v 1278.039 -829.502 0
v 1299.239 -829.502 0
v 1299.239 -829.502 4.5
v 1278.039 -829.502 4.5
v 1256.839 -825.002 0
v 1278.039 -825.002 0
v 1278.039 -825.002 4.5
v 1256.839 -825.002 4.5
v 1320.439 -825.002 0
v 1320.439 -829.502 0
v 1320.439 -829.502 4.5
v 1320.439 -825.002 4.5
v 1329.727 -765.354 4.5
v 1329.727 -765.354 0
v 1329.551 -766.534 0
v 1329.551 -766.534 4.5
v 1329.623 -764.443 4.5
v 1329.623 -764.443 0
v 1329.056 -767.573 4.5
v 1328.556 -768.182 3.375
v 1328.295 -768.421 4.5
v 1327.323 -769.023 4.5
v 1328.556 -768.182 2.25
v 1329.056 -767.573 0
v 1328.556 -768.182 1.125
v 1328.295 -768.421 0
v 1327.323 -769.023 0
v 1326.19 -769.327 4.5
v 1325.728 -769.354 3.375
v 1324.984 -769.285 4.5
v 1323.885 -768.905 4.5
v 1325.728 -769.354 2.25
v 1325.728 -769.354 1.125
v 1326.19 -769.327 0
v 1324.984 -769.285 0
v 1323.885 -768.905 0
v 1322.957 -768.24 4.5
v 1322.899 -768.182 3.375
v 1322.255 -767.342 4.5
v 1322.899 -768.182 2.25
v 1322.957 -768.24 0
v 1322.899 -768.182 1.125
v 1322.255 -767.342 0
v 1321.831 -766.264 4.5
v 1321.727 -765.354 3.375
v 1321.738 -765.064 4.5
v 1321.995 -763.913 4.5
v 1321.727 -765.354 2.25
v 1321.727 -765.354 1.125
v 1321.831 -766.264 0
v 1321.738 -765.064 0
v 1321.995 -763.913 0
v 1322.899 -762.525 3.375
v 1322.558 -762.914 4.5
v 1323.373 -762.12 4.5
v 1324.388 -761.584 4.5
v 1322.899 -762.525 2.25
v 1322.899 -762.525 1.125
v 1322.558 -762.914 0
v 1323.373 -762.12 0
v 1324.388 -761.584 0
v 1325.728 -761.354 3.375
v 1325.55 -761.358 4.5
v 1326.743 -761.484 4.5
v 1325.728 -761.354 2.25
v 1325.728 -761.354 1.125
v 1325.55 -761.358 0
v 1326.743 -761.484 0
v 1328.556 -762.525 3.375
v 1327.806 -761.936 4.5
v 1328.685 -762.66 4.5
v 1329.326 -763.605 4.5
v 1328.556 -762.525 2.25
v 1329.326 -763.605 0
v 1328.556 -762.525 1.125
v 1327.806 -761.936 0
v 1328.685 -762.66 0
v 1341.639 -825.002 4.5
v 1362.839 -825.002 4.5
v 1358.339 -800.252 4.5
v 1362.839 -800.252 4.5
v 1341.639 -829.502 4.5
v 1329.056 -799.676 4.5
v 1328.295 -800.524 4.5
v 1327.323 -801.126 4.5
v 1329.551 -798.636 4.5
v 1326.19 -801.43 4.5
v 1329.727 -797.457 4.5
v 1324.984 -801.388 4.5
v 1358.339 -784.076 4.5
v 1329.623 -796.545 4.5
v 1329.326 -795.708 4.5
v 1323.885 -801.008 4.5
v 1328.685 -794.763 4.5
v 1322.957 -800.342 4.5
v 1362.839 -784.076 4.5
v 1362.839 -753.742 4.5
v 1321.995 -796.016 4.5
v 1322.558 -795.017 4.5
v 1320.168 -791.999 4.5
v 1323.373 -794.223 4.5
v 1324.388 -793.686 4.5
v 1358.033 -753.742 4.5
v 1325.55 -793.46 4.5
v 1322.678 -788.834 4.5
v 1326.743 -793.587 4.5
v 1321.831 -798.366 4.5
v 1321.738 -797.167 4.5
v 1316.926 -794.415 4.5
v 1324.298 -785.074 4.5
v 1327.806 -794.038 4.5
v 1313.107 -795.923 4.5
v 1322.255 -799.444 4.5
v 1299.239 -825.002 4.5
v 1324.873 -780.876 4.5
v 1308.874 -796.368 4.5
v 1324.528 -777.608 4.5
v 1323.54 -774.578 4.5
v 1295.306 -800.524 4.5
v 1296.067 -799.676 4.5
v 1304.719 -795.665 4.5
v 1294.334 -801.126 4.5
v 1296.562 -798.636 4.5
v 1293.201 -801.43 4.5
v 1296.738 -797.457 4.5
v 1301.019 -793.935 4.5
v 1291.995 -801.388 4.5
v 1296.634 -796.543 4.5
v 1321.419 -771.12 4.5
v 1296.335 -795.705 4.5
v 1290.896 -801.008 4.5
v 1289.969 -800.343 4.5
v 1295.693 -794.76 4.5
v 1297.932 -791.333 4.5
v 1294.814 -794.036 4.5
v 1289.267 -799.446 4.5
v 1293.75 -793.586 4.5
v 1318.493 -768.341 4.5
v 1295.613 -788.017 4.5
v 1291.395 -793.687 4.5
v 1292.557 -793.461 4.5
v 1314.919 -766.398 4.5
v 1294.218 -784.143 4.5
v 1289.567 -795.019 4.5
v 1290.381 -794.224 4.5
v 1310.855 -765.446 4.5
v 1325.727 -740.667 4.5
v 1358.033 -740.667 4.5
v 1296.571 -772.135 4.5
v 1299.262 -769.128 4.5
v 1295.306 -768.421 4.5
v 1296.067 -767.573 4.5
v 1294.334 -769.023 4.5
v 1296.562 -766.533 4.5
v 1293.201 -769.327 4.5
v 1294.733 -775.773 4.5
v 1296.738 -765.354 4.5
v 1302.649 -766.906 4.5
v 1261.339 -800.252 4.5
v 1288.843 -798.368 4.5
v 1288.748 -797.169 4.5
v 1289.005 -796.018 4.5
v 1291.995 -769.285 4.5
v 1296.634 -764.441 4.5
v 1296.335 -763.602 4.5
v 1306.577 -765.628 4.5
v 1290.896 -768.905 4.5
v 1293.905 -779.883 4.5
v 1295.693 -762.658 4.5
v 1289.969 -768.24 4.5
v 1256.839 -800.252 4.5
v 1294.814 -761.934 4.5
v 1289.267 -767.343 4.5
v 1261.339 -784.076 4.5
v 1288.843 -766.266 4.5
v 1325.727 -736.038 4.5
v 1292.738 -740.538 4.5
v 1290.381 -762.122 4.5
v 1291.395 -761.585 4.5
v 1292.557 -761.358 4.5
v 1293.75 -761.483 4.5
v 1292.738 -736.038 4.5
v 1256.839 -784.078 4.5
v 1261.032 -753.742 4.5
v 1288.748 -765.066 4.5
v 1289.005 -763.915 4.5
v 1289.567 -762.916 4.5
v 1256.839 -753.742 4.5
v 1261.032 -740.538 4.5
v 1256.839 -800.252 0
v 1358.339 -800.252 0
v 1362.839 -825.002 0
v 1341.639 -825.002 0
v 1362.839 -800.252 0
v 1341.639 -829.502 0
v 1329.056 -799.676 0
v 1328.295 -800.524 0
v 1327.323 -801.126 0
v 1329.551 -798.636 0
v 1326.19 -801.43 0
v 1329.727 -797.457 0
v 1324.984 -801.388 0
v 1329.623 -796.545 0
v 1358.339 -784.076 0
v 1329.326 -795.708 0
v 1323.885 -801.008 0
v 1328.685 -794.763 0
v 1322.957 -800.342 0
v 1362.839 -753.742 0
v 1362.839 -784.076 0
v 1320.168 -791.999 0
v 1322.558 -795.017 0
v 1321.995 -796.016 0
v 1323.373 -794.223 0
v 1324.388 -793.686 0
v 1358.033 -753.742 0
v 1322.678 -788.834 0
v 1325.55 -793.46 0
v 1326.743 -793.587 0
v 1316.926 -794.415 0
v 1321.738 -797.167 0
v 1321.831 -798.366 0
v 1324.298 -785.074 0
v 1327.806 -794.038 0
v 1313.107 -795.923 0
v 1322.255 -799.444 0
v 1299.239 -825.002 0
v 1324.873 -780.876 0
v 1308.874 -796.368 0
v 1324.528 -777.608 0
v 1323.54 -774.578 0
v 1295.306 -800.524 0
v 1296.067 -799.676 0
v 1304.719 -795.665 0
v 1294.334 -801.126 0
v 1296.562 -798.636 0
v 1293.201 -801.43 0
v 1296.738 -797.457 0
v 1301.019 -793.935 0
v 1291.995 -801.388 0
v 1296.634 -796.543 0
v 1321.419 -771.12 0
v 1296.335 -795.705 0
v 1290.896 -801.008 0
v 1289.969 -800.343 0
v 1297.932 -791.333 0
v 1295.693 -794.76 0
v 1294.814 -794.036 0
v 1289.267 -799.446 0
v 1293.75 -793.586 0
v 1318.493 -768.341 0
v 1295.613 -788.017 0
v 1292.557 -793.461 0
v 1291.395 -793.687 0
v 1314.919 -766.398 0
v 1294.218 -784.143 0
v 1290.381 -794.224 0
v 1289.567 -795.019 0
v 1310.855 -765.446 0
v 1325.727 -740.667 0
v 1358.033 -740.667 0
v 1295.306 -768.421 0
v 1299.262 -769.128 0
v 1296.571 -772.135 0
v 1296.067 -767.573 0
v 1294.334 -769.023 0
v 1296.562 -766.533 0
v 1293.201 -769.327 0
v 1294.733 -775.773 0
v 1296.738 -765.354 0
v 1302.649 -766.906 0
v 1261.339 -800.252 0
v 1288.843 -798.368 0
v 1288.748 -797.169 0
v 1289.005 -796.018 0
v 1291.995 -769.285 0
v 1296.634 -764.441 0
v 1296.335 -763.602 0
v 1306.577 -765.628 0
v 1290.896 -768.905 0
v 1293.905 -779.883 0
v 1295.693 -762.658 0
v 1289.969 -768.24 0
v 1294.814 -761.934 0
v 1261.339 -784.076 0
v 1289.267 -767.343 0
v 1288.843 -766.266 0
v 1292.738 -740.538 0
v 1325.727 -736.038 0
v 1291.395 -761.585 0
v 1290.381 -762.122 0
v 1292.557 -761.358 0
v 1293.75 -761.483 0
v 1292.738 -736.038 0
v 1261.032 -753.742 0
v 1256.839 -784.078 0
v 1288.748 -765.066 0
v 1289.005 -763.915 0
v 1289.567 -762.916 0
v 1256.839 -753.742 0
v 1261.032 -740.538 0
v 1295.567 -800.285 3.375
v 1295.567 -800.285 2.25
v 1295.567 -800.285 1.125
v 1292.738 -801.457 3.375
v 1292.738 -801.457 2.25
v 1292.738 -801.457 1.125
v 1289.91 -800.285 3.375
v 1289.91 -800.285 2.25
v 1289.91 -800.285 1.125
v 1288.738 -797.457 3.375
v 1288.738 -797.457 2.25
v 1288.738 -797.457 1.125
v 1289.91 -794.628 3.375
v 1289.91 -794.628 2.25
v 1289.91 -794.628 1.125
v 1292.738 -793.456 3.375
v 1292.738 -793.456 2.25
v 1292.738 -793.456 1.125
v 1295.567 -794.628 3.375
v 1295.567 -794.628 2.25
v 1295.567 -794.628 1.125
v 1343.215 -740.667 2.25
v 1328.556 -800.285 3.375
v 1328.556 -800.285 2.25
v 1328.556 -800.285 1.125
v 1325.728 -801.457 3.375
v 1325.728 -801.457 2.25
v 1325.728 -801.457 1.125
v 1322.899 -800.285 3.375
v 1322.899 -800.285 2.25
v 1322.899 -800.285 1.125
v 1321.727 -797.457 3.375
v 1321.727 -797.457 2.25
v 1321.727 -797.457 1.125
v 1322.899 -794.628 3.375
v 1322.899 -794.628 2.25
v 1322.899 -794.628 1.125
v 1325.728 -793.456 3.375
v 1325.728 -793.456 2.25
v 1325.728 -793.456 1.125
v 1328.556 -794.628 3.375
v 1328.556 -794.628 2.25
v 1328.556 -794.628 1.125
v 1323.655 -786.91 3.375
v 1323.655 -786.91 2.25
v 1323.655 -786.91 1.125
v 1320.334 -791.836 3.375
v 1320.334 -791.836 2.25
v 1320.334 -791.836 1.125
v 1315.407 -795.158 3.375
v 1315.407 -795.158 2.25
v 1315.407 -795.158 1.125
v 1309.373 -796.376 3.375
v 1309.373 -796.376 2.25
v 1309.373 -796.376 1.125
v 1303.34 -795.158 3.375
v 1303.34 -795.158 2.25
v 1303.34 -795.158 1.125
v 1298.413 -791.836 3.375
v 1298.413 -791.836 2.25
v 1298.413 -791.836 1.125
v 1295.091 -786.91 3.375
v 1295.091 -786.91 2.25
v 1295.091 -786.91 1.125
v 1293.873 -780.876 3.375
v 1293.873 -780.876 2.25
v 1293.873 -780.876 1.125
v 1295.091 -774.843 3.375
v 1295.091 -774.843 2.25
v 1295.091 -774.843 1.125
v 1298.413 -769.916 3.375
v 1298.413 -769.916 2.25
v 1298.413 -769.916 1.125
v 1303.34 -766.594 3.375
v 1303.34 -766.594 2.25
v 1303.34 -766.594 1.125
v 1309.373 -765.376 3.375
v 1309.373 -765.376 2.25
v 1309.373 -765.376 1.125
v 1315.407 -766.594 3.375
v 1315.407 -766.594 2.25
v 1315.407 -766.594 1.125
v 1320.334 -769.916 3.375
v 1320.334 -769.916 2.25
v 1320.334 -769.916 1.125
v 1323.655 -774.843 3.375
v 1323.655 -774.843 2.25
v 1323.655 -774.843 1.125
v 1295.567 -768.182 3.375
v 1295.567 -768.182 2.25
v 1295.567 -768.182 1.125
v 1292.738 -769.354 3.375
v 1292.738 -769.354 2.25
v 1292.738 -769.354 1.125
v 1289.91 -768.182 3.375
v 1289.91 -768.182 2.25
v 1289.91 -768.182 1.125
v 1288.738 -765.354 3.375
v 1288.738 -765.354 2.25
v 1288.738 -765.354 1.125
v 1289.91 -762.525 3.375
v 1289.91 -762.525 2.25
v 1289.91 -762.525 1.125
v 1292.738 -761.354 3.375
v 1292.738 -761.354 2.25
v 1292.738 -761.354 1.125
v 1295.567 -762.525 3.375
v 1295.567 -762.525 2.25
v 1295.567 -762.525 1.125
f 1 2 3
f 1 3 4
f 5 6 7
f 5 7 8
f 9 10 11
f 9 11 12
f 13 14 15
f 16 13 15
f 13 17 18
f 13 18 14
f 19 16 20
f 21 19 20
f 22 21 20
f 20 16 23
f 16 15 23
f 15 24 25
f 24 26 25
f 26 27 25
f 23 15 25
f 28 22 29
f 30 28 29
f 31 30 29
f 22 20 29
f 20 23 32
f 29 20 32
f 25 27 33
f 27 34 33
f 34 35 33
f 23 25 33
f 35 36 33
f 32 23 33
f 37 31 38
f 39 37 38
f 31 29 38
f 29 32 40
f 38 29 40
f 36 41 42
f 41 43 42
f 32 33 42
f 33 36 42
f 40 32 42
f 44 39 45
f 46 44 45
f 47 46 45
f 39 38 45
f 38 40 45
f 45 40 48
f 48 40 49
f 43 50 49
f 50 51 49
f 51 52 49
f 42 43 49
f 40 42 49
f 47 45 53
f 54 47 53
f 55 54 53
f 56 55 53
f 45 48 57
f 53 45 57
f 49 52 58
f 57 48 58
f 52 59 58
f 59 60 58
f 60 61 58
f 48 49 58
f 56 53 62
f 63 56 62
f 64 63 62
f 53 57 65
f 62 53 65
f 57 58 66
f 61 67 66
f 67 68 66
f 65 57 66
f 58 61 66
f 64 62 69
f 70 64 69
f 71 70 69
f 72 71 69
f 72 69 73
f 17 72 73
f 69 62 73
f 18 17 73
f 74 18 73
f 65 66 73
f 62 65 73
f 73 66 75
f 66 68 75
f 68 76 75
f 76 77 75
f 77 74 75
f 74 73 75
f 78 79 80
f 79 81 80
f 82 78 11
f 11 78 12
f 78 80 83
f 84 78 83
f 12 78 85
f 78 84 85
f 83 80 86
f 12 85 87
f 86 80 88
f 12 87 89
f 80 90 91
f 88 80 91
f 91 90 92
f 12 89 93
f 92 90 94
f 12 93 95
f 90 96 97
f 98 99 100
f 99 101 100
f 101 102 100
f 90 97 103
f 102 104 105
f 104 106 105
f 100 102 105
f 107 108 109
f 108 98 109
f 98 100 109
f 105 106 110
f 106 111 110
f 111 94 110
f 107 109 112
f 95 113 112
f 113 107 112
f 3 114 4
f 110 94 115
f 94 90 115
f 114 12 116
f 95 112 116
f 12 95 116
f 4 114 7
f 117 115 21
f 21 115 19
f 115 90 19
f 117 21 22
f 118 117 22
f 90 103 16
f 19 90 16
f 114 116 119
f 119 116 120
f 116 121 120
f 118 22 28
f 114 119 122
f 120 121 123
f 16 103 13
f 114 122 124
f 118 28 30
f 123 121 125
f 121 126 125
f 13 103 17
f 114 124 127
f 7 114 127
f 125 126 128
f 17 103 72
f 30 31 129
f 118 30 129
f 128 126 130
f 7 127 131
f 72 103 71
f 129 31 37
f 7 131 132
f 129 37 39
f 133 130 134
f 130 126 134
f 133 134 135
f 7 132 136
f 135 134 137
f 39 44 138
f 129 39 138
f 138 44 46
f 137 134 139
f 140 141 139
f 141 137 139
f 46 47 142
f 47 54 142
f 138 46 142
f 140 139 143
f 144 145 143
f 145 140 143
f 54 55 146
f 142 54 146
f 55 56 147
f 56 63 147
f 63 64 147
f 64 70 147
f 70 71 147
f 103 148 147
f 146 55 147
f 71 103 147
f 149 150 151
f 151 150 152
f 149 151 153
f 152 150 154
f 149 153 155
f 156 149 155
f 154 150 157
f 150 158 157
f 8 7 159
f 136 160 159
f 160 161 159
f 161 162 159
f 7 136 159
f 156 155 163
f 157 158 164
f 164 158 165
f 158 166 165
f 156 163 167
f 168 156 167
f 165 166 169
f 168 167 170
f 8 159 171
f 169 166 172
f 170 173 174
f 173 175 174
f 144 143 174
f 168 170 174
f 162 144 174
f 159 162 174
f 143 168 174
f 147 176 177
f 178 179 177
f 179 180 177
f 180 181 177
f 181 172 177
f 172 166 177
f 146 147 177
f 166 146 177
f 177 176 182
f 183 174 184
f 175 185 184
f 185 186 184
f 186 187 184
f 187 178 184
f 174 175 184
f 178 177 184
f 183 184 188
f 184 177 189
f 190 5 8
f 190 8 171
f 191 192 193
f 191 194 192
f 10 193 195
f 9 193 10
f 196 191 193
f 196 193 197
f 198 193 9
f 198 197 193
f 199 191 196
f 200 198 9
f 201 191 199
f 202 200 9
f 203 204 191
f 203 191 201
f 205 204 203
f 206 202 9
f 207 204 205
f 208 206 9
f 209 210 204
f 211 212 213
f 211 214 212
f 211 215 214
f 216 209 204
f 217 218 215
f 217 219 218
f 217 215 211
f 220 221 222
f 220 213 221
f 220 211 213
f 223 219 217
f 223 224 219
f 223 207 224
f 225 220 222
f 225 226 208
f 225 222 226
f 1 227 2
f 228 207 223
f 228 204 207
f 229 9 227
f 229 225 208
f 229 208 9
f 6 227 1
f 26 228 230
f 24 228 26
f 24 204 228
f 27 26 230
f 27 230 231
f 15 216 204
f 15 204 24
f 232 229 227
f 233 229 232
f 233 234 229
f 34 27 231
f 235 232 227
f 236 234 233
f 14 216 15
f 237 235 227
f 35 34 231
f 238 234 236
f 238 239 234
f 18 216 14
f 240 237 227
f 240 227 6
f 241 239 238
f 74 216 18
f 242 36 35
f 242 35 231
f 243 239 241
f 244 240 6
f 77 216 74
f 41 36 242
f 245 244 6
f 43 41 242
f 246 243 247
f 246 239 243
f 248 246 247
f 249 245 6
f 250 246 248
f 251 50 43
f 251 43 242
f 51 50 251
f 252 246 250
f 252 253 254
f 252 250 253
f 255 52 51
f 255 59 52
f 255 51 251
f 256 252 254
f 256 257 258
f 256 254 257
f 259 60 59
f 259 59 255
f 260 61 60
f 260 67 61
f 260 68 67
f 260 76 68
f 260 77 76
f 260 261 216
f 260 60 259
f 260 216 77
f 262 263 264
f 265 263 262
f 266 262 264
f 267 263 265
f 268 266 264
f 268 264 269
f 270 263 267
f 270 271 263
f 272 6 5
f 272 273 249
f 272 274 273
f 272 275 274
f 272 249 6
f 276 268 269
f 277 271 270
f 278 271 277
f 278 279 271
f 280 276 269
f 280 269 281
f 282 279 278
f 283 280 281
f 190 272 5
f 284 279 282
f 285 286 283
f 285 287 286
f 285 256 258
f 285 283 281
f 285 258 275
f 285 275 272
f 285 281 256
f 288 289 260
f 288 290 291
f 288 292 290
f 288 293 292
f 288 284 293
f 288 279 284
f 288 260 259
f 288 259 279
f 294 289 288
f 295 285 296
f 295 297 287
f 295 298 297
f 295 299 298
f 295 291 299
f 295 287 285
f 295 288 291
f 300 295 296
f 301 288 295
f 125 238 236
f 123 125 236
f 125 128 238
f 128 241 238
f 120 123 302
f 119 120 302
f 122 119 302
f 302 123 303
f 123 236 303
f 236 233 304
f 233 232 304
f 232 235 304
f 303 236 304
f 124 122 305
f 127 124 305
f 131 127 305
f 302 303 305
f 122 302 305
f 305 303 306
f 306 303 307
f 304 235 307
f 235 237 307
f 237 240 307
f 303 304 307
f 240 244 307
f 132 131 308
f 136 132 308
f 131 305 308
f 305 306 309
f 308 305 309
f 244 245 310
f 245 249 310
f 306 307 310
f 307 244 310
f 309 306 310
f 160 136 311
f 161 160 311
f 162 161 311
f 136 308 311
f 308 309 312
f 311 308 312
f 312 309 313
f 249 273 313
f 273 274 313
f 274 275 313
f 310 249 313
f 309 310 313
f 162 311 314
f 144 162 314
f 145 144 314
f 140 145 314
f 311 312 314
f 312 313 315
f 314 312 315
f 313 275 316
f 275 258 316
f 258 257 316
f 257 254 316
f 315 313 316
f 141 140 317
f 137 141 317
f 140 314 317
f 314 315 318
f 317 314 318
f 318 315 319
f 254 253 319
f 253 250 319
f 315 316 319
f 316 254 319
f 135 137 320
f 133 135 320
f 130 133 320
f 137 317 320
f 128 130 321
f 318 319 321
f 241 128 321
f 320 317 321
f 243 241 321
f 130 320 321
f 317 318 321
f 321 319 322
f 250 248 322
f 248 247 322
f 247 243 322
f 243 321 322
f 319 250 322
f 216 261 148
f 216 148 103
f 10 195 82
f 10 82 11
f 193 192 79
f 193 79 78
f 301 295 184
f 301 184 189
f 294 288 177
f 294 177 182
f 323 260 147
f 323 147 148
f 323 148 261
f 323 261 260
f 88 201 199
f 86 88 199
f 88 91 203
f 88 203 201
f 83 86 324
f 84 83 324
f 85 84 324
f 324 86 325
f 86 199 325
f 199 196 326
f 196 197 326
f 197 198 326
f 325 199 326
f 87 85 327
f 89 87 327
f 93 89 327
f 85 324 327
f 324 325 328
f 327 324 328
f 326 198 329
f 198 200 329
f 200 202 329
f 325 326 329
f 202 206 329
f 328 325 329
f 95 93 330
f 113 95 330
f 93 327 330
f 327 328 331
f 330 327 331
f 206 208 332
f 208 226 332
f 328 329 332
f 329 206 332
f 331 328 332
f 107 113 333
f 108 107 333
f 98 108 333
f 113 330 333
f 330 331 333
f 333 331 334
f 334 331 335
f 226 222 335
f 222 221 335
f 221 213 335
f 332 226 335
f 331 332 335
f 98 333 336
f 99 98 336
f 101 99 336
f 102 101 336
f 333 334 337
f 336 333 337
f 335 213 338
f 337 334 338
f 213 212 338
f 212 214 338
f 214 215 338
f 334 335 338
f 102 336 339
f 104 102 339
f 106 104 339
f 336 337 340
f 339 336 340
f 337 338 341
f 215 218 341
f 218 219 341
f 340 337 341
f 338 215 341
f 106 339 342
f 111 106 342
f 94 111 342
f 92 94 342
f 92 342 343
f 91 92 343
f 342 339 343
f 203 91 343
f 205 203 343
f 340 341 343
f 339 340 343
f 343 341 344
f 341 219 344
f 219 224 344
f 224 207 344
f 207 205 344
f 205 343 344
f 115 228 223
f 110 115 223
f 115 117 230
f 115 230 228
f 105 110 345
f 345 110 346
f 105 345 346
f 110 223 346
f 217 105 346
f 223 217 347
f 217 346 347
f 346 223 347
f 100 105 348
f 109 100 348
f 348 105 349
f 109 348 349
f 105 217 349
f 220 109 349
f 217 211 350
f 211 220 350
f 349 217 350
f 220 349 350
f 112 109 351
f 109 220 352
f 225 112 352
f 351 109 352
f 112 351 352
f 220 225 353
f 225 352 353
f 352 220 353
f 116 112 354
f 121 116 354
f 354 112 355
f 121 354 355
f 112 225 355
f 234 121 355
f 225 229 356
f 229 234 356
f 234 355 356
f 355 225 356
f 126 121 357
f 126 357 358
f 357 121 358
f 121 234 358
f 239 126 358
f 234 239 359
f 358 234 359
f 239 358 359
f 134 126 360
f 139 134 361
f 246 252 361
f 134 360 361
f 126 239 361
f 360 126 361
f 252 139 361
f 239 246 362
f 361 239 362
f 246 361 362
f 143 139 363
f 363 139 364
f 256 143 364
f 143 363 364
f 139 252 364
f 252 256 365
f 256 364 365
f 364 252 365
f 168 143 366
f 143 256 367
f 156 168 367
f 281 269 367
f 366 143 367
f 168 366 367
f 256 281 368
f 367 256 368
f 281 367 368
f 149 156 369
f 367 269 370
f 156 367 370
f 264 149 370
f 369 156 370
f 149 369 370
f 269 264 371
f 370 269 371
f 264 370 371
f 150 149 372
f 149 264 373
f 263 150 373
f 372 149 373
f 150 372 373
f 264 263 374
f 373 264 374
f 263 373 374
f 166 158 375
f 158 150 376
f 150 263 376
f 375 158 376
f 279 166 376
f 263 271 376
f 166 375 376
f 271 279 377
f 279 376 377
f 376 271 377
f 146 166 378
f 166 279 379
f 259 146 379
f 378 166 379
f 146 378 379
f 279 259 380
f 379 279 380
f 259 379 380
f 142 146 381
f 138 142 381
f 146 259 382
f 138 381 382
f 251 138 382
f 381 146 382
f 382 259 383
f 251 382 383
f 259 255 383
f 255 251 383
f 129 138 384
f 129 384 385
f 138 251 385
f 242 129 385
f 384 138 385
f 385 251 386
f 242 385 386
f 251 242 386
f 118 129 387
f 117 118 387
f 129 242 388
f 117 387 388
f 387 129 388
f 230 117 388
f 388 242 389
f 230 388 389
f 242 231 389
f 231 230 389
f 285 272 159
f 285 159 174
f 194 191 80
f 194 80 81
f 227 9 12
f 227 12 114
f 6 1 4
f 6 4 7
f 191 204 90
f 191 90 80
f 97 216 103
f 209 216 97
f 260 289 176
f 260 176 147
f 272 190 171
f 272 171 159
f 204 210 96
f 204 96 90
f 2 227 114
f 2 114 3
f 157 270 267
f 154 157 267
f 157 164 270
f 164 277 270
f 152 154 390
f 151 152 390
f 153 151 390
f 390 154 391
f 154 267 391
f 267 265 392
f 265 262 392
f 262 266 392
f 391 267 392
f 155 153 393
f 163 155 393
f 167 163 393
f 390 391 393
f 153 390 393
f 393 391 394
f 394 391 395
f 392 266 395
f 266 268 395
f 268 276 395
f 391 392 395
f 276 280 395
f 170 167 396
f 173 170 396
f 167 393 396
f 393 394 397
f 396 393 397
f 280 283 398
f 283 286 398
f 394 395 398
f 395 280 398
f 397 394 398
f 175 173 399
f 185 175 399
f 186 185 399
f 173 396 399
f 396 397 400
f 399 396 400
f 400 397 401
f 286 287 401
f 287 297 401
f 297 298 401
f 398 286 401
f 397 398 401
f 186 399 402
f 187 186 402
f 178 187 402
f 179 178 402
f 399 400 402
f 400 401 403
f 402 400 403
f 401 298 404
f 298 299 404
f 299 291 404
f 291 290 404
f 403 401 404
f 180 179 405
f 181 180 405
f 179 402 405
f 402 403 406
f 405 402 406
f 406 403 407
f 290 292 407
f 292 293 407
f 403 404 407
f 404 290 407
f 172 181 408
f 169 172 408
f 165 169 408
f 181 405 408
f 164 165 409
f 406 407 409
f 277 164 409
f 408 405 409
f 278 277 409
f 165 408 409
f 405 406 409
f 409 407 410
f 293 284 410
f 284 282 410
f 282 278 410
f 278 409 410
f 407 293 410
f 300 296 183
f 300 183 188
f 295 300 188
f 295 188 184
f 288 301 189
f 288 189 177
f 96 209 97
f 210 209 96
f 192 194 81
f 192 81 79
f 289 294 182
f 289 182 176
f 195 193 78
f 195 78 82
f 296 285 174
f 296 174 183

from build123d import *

# Parameters (mm, degrees)
BOSS_EXTRUDE1_DEPTH = 4.5


with BuildPart() as part:
    # Model → Boss-Extrude1 (new body)
    with BuildSketch(Plane.XY):
        with BuildLine():
            Line((1362.839116326, -825.001665905), (1341.639041609, -825.001665905))
            Line((1341.639041609, -825.001665905), (1341.639041609, -829.501663959))
            Line((1341.639041609, -829.501663959), (1320.439284392, -829.501663959))
            Line((1320.439284392, -829.501663959), (1320.439284392, -825.001665905))
            Line((1320.439284392, -825.001665905), (1299.238856897, -825.001665905))
            Line((1299.238856897, -825.001665905), (1299.238856897, -829.501663959))
            Line((1299.238856897, -829.501663959), (1278.039134958, -829.501663959))
            Line((1278.039134958, -829.501663959), (1278.039134958, -825.001665905))
            Line((1278.039134958, -825.001665905), (1256.839060241, -825.001665905))
            Line((1256.839060241, -825.001665905), (1256.839060241, -800.2517648))
            Line((1256.839060241, -800.2517648), (1261.339023018, -800.2517648))
            Line((1261.339023018, -800.2517648), (1261.339023018, -784.076339248))
            Line((1261.339023018, -784.076339248), (1256.839060241, -784.077715082))
            Line((1256.839060241, -784.077715082), (1256.839060241, -753.742283423))
            Line((1256.839060241, -753.742283423), (1261.032423851, -753.742283423))
            Line((1261.032423851, -753.742283423), (1261.032423851, -740.537740648))
            Line((1261.032423851, -740.537740648), (1292.737973843, -740.537740648))
            Line((1292.737973843, -740.537740648), (1292.737973843, -736.037777872))
            Line((1292.737973843, -736.037777872), (1325.727176335, -736.037777872))
            Line((1325.727176335, -736.037777872), (1325.727176335, -740.667457037))
            add(Edge.make_bspline(
                [(1325.727176335, -740.667457037), (1344.550481331, -740.667457037), (1358.032519105, -740.667457037)],
                knots=[0, 0, 0, 1, 1, 1], degree=2))
            Line((1358.032519105, -740.667457037), (1358.032519105, -753.742283423))
            Line((1358.032519105, -753.742283423), (1362.839116326, -753.742283423))
            Line((1362.839116326, -753.742283423), (1362.839116326, -784.076339248))
            Line((1362.839116326, -784.076339248), (1358.339153549, -784.076339248))
            Line((1358.339153549, -784.076339248), (1358.339153549, -800.2517648))
            Line((1358.339153549, -800.2517648), (1362.839116326, -800.2517648))
            Line((1362.839116326, -800.2517648), (1362.839116326, -825.001665905))
        make_face()
        with BuildLine():
            add(Edge.make_bspline(
                [(1293.873494954, -780.876362583), (1293.873494954, -772.315645362), (1300.812245786, -765.376188975), (1309.373315784, -765.376188975), (1317.933680226, -765.376188975), (1324.873489391, -772.315645362), (1324.873489391, -780.876362583)],
                knots=[2, 2, 2, 2, 3, 3, 3, 4, 4, 4, 4], degree=3))
            add(Edge.make_bspline(
                [(1324.873489391, -780.876362583), (1324.873489391, -789.436550636), (1317.933680226, -796.376183412), (1309.373315784, -796.376183412), (1300.812245786, -796.376183412), (1293.873494954, -789.436550636), (1293.873494954, -780.876362583)],
                knots=[0, 0, 0, 0, 1, 1, 1, 2, 2, 2, 2], degree=3))
        make_face(mode=Mode.SUBTRACT)
        with BuildLine():
            add(Edge.make_bspline(
                [(1321.72741717, -797.456918134), (1321.72741717, -795.247223968), (1323.518540502, -793.456488691), (1325.727529113, -793.456488691), (1327.936517724, -793.456488691), (1329.727288279, -795.247223968), (1329.727288279, -797.456918134)],
                knots=[2, 2, 2, 2, 3, 3, 3, 4, 4, 4, 4], degree=3))
            add(Edge.make_bspline(
                [(1329.727288279, -797.456918134), (1329.727288279, -799.665906745), (1327.936517724, -801.4566773), (1325.727529113, -801.4566773), (1323.518540502, -801.4566773), (1321.72741717, -799.665906745), (1321.72741717, -797.456918134)],
                knots=[0, 0, 0, 0, 1, 1, 1, 2, 2, 2, 2], degree=3))
        make_face(mode=Mode.SUBTRACT)
        with BuildLine():
            add(Edge.make_bspline(
                [(1321.72741717, -765.354140364), (1321.72741717, -763.144446198), (1323.518540502, -761.353710921), (1325.727529113, -761.353710921), (1327.936517724, -761.353710921), (1329.727288279, -763.144446198), (1329.727288279, -765.354140364)],
                knots=[2, 2, 2, 2, 3, 3, 3, 4, 4, 4, 4], degree=3))
            add(Edge.make_bspline(
                [(1329.727288279, -765.354140364), (1329.727288279, -767.563128975), (1327.936517724, -769.35389953), (1325.727529113, -769.35389953), (1323.518540502, -769.35389953), (1321.72741717, -767.563128975), (1321.72741717, -765.354140364)],
                knots=[0, 0, 0, 0, 1, 1, 1, 2, 2, 2, 2], degree=3))
        make_face(mode=Mode.SUBTRACT)
        with BuildLine():
            add(Edge.make_bspline(
                [(1288.738214678, -765.354140364), (1288.738214678, -763.144446198), (1290.528985233, -761.353710921), (1292.738326621, -761.353710921), (1294.947315232, -761.353710921), (1296.738403287, -763.144446198), (1296.738403287, -765.354140364)],
                knots=[2, 2, 2, 2, 3, 3, 3, 4, 4, 4, 4], degree=3))
            add(Edge.make_bspline(
                [(1296.738403287, -765.354140364), (1296.738403287, -767.563128975), (1294.947315232, -769.35389953), (1292.738326621, -769.35389953), (1290.528985233, -769.35389953), (1288.738214678, -767.563128975), (1288.738214678, -765.354140364)],
                knots=[0, 0, 0, 0, 1, 1, 1, 2, 2, 2, 2], degree=3))
        make_face(mode=Mode.SUBTRACT)
        with BuildLine():
            add(Edge.make_bspline(
                [(1288.738214678, -797.456918134), (1288.738214678, -795.247223968), (1290.528985233, -793.456488691), (1292.738326621, -793.456488691), (1294.947315232, -793.456488691), (1296.738403287, -795.247223968), (1296.738403287, -797.456918134)],
                knots=[2, 2, 2, 2, 3, 3, 3, 4, 4, 4, 4], degree=3))
            add(Edge.make_bspline(
                [(1296.738403287, -797.456918134), (1296.738403287, -799.665906745), (1294.947315232, -801.4566773), (1292.738326621, -801.4566773), (1290.528985233, -801.4566773), (1288.738214678, -799.665906745), (1288.738214678, -797.456918134)],
                knots=[0, 0, 0, 0, 1, 1, 1, 2, 2, 2, 2], degree=3))
        make_face(mode=Mode.SUBTRACT)
    extrude(amount=BOSS_EXTRUDE1_DEPTH)


solid = part.part
